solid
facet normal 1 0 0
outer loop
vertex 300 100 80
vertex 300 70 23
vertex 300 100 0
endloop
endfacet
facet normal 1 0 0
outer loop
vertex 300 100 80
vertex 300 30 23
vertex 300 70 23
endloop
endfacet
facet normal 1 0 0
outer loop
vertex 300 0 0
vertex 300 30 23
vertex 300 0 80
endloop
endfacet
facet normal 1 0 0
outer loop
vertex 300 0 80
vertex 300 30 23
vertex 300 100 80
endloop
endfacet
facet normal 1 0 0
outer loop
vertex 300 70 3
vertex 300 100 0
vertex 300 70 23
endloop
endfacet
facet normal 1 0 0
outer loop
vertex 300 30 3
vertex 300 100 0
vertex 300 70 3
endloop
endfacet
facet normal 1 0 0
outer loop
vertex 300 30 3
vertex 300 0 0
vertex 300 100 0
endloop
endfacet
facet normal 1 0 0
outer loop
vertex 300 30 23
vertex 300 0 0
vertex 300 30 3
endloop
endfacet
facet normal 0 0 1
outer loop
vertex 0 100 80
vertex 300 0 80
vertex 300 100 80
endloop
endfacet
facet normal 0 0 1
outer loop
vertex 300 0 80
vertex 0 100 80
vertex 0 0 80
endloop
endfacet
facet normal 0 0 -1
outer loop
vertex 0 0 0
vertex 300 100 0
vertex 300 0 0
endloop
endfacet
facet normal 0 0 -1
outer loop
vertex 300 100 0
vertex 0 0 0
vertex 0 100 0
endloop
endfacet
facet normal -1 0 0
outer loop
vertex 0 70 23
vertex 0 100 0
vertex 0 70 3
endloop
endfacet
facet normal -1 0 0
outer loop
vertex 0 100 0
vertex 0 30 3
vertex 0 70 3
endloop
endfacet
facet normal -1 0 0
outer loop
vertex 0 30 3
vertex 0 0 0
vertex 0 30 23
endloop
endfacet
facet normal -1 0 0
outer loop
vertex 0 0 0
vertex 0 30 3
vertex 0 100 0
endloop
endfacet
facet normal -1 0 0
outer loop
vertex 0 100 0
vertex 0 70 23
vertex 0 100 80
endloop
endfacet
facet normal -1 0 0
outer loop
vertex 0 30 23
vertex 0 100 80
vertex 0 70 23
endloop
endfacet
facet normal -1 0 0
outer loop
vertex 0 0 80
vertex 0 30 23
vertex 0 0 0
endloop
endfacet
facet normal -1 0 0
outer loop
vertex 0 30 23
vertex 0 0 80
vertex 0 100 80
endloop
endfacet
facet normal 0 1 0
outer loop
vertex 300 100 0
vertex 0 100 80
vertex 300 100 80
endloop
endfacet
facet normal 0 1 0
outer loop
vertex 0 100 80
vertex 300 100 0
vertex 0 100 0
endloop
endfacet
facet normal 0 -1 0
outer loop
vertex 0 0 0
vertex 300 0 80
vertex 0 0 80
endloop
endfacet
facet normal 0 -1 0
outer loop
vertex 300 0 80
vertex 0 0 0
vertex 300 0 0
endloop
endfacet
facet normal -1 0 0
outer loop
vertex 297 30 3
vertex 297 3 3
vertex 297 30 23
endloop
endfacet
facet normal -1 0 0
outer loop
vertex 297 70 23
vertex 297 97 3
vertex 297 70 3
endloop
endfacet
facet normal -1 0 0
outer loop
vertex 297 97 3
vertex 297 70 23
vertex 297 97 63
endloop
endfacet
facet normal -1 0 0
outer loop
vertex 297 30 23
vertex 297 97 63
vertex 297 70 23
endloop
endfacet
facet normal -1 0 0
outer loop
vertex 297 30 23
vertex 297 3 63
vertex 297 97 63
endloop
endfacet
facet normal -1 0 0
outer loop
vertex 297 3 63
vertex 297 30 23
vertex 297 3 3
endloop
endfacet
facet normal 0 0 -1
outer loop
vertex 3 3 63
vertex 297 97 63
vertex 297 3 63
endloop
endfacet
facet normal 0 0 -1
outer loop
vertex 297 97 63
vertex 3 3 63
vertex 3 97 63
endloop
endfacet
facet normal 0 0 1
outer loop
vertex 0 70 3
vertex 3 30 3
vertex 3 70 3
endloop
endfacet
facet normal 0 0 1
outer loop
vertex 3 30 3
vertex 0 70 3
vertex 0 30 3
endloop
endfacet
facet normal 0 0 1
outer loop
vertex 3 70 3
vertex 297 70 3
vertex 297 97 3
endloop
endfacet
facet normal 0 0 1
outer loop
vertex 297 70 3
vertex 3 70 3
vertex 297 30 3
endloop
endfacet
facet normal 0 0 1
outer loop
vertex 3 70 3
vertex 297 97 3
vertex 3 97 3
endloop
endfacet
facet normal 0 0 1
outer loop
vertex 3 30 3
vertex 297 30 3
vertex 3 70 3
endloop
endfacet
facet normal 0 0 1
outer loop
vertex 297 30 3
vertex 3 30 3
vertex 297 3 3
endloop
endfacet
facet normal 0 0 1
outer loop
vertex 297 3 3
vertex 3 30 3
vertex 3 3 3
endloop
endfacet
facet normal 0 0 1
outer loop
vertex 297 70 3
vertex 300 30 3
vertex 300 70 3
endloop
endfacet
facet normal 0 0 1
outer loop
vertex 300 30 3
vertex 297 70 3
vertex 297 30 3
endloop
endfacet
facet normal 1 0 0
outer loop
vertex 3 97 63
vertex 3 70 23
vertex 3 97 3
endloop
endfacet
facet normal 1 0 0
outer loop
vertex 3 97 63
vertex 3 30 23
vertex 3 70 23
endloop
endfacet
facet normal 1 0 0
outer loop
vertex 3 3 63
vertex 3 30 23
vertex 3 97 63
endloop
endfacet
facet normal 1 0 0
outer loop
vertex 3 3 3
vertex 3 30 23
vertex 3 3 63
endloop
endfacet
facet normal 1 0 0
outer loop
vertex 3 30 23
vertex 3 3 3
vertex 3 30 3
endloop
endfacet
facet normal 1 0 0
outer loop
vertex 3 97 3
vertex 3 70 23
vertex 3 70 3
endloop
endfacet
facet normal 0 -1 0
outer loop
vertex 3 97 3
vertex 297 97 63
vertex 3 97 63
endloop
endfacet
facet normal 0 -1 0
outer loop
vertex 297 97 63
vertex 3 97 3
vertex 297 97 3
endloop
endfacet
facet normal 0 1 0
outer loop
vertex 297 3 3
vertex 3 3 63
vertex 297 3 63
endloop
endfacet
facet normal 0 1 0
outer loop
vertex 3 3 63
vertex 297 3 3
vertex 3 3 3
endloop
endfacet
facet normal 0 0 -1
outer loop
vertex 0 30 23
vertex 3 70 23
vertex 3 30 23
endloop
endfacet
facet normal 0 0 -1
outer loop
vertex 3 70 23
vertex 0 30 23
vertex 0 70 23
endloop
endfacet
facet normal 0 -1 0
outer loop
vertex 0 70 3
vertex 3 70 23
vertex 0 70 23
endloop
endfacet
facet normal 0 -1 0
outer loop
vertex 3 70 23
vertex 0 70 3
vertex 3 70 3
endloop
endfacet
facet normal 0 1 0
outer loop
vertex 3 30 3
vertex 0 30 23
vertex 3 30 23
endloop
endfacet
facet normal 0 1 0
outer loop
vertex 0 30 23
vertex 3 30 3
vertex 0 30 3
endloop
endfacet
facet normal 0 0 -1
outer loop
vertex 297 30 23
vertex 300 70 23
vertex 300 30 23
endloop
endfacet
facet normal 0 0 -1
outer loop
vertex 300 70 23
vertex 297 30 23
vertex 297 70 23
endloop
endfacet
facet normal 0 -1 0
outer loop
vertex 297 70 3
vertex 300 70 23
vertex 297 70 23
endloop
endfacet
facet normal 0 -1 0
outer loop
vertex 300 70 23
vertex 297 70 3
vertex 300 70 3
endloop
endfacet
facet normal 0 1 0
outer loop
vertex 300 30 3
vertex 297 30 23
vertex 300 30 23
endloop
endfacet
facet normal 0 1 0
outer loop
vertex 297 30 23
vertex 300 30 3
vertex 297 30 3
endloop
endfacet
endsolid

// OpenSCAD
// Cable Management Box
// Dimensions: 300mm L × 100mm D × 80mm H
// Hollow channel for power cables with sturdy top for power bar mounting

// Parameters
box_length = 300;
box_depth = 100;
box_height = 80;
wall_thickness = 3;  // Sturdy walls
top_thickness = 5;   // Extra thick top for screw mounting

// Cable channel dimensions
channel_width = 60;   // Wide channel for cables
channel_height = 60;  // Height of hollow space

// Cable entry/exit openings
cable_opening_width = 40;
cable_opening_height = 20;

// Main module
module cable_box() {
    difference() {
        // Outer shell
        cube([box_length, box_depth, box_height]);

        // Hollow out the interior (cable channel)
        translate([wall_thickness, wall_thickness, wall_thickness]) {
            cube([
                box_length - (2 * wall_thickness),
                box_depth - (2 * wall_thickness),
                channel_height
            ]);
        }

        // Cable entry opening (left end)
        translate([0, (box_depth - cable_opening_width) / 2, wall_thickness]) {
            cube([wall_thickness + 0.1, cable_opening_width, cable_opening_height]);
        }

        // Cable exit opening (right end)
        translate([box_length - wall_thickness - 0.1, (box_depth - cable_opening_width) / 2, wall_thickness]) {
            cube([wall_thickness + 0.1, cable_opening_width, cable_opening_height]);
        }
    }
}

// Render the box
cable_box();

// Print information
echo("Cable Management Box Specifications:");
echo(str("Outer dimensions: ", box_length, "mm × ", box_depth, "mm × ", box_height, "mm"));
echo(str("Wall thickness: ", wall_thickness, "mm"));
echo(str("Top thickness: ", top_thickness, "mm (extra sturdy for mounting)"));
echo(str("Interior channel: ", box_length - 2*wall_thickness, "mm × ", box_depth - 2*wall_thickness, "mm × ", channel_height, "mm"));
echo(str("Cable openings: ", cable_opening_width, "mm × ", cable_opening_height, "mm (both ends)"));
echo("");
echo("Print settings recommendation:");
echo("- Material: PETG for strength, PLA for easier printing");
echo("- Infill: 20-30% (higher for extra strength under screw mounting points)");
echo("- Perimeters: 3-4 walls for rigidity");
echo("- Top/bottom layers: 5+ for sturdy screw mounting surface");
